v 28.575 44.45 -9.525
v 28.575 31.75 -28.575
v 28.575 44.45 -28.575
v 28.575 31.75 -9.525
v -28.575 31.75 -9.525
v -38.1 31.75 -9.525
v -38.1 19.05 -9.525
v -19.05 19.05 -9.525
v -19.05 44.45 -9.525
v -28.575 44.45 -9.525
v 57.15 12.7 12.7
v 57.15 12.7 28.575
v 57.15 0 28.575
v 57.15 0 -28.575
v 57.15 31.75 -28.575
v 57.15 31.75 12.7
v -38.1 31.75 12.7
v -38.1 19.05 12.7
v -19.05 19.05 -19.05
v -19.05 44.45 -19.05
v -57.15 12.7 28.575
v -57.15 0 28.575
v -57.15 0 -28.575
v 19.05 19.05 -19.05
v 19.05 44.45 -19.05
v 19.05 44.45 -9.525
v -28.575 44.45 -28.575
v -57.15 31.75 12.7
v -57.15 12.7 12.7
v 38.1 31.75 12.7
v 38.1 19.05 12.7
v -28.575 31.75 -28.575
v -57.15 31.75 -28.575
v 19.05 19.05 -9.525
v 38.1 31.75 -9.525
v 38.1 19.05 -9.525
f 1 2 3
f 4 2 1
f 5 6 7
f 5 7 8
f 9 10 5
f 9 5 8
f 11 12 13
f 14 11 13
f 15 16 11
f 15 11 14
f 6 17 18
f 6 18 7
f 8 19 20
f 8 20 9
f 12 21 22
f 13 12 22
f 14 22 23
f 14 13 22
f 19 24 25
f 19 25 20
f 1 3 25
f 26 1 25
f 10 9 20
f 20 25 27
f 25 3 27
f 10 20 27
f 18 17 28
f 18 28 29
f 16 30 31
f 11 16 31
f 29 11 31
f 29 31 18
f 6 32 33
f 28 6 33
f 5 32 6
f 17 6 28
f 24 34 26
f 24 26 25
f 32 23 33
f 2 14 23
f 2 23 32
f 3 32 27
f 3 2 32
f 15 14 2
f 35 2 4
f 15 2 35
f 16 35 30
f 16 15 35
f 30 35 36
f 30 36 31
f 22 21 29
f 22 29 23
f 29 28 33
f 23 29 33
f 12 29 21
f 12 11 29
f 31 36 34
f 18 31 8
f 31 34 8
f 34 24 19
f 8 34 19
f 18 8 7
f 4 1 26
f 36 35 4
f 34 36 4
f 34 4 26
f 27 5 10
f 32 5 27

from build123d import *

# Parameters (mm, degrees)
BOSS_EXTRUDE1_DEPTH = 57.15
BOSS_EXTRUDE2_DEPTH = 12.7
CUT_EXTRUDE1_DEPTH  = 25.4


with BuildPart() as part:
    # Sketch1 → Boss-Extrude1 (new body, symmetric)
    with BuildSketch(Plane(origin=(0, 0, 0), x_dir=(0, 0, -1), z_dir=(1, 0, 0))):
        Polygon((-28.575, 0), (28.575, 0), (28.575, 31.75), (-12.7, 31.75), (-12.7, 12.7), (-28.575, 12.7), align=None)
    extrude(amount=BOSS_EXTRUDE1_DEPTH, both=True)

    # Sketch2 → Boss-Extrude2 (add)
    with BuildSketch(Plane(origin=(0, 31.75, 0), x_dir=(1, 0, 0), z_dir=(0, 1, 0))):
        Polygon((-28.575, 28.575), (28.575, 28.575), (28.575, 9.525), (19.05, 9.525), (19.05, 19.05), (-19.05, 19.05), (-19.05, 9.525), (-28.575, 9.525), align=None)
    extrude(amount=BOSS_EXTRUDE2_DEPTH)

    # Sketch3 → Cut-Extrude1 (cut)
    with BuildSketch(Plane(origin=(0, 44.45, 0), x_dir=(1, 0, 0), z_dir=(0, 1, 0))):
        Polygon((-38.1, 9.525), (-19.05, 9.525), (-19.05, 19.05), (19.05, 19.05), (19.05, 9.525), (38.1, 9.525), (38.1, -12.7), (-38.1, -12.7), align=None)
    extrude(amount=-CUT_EXTRUDE1_DEPTH, mode=Mode.SUBTRACT)


solid = part.part
